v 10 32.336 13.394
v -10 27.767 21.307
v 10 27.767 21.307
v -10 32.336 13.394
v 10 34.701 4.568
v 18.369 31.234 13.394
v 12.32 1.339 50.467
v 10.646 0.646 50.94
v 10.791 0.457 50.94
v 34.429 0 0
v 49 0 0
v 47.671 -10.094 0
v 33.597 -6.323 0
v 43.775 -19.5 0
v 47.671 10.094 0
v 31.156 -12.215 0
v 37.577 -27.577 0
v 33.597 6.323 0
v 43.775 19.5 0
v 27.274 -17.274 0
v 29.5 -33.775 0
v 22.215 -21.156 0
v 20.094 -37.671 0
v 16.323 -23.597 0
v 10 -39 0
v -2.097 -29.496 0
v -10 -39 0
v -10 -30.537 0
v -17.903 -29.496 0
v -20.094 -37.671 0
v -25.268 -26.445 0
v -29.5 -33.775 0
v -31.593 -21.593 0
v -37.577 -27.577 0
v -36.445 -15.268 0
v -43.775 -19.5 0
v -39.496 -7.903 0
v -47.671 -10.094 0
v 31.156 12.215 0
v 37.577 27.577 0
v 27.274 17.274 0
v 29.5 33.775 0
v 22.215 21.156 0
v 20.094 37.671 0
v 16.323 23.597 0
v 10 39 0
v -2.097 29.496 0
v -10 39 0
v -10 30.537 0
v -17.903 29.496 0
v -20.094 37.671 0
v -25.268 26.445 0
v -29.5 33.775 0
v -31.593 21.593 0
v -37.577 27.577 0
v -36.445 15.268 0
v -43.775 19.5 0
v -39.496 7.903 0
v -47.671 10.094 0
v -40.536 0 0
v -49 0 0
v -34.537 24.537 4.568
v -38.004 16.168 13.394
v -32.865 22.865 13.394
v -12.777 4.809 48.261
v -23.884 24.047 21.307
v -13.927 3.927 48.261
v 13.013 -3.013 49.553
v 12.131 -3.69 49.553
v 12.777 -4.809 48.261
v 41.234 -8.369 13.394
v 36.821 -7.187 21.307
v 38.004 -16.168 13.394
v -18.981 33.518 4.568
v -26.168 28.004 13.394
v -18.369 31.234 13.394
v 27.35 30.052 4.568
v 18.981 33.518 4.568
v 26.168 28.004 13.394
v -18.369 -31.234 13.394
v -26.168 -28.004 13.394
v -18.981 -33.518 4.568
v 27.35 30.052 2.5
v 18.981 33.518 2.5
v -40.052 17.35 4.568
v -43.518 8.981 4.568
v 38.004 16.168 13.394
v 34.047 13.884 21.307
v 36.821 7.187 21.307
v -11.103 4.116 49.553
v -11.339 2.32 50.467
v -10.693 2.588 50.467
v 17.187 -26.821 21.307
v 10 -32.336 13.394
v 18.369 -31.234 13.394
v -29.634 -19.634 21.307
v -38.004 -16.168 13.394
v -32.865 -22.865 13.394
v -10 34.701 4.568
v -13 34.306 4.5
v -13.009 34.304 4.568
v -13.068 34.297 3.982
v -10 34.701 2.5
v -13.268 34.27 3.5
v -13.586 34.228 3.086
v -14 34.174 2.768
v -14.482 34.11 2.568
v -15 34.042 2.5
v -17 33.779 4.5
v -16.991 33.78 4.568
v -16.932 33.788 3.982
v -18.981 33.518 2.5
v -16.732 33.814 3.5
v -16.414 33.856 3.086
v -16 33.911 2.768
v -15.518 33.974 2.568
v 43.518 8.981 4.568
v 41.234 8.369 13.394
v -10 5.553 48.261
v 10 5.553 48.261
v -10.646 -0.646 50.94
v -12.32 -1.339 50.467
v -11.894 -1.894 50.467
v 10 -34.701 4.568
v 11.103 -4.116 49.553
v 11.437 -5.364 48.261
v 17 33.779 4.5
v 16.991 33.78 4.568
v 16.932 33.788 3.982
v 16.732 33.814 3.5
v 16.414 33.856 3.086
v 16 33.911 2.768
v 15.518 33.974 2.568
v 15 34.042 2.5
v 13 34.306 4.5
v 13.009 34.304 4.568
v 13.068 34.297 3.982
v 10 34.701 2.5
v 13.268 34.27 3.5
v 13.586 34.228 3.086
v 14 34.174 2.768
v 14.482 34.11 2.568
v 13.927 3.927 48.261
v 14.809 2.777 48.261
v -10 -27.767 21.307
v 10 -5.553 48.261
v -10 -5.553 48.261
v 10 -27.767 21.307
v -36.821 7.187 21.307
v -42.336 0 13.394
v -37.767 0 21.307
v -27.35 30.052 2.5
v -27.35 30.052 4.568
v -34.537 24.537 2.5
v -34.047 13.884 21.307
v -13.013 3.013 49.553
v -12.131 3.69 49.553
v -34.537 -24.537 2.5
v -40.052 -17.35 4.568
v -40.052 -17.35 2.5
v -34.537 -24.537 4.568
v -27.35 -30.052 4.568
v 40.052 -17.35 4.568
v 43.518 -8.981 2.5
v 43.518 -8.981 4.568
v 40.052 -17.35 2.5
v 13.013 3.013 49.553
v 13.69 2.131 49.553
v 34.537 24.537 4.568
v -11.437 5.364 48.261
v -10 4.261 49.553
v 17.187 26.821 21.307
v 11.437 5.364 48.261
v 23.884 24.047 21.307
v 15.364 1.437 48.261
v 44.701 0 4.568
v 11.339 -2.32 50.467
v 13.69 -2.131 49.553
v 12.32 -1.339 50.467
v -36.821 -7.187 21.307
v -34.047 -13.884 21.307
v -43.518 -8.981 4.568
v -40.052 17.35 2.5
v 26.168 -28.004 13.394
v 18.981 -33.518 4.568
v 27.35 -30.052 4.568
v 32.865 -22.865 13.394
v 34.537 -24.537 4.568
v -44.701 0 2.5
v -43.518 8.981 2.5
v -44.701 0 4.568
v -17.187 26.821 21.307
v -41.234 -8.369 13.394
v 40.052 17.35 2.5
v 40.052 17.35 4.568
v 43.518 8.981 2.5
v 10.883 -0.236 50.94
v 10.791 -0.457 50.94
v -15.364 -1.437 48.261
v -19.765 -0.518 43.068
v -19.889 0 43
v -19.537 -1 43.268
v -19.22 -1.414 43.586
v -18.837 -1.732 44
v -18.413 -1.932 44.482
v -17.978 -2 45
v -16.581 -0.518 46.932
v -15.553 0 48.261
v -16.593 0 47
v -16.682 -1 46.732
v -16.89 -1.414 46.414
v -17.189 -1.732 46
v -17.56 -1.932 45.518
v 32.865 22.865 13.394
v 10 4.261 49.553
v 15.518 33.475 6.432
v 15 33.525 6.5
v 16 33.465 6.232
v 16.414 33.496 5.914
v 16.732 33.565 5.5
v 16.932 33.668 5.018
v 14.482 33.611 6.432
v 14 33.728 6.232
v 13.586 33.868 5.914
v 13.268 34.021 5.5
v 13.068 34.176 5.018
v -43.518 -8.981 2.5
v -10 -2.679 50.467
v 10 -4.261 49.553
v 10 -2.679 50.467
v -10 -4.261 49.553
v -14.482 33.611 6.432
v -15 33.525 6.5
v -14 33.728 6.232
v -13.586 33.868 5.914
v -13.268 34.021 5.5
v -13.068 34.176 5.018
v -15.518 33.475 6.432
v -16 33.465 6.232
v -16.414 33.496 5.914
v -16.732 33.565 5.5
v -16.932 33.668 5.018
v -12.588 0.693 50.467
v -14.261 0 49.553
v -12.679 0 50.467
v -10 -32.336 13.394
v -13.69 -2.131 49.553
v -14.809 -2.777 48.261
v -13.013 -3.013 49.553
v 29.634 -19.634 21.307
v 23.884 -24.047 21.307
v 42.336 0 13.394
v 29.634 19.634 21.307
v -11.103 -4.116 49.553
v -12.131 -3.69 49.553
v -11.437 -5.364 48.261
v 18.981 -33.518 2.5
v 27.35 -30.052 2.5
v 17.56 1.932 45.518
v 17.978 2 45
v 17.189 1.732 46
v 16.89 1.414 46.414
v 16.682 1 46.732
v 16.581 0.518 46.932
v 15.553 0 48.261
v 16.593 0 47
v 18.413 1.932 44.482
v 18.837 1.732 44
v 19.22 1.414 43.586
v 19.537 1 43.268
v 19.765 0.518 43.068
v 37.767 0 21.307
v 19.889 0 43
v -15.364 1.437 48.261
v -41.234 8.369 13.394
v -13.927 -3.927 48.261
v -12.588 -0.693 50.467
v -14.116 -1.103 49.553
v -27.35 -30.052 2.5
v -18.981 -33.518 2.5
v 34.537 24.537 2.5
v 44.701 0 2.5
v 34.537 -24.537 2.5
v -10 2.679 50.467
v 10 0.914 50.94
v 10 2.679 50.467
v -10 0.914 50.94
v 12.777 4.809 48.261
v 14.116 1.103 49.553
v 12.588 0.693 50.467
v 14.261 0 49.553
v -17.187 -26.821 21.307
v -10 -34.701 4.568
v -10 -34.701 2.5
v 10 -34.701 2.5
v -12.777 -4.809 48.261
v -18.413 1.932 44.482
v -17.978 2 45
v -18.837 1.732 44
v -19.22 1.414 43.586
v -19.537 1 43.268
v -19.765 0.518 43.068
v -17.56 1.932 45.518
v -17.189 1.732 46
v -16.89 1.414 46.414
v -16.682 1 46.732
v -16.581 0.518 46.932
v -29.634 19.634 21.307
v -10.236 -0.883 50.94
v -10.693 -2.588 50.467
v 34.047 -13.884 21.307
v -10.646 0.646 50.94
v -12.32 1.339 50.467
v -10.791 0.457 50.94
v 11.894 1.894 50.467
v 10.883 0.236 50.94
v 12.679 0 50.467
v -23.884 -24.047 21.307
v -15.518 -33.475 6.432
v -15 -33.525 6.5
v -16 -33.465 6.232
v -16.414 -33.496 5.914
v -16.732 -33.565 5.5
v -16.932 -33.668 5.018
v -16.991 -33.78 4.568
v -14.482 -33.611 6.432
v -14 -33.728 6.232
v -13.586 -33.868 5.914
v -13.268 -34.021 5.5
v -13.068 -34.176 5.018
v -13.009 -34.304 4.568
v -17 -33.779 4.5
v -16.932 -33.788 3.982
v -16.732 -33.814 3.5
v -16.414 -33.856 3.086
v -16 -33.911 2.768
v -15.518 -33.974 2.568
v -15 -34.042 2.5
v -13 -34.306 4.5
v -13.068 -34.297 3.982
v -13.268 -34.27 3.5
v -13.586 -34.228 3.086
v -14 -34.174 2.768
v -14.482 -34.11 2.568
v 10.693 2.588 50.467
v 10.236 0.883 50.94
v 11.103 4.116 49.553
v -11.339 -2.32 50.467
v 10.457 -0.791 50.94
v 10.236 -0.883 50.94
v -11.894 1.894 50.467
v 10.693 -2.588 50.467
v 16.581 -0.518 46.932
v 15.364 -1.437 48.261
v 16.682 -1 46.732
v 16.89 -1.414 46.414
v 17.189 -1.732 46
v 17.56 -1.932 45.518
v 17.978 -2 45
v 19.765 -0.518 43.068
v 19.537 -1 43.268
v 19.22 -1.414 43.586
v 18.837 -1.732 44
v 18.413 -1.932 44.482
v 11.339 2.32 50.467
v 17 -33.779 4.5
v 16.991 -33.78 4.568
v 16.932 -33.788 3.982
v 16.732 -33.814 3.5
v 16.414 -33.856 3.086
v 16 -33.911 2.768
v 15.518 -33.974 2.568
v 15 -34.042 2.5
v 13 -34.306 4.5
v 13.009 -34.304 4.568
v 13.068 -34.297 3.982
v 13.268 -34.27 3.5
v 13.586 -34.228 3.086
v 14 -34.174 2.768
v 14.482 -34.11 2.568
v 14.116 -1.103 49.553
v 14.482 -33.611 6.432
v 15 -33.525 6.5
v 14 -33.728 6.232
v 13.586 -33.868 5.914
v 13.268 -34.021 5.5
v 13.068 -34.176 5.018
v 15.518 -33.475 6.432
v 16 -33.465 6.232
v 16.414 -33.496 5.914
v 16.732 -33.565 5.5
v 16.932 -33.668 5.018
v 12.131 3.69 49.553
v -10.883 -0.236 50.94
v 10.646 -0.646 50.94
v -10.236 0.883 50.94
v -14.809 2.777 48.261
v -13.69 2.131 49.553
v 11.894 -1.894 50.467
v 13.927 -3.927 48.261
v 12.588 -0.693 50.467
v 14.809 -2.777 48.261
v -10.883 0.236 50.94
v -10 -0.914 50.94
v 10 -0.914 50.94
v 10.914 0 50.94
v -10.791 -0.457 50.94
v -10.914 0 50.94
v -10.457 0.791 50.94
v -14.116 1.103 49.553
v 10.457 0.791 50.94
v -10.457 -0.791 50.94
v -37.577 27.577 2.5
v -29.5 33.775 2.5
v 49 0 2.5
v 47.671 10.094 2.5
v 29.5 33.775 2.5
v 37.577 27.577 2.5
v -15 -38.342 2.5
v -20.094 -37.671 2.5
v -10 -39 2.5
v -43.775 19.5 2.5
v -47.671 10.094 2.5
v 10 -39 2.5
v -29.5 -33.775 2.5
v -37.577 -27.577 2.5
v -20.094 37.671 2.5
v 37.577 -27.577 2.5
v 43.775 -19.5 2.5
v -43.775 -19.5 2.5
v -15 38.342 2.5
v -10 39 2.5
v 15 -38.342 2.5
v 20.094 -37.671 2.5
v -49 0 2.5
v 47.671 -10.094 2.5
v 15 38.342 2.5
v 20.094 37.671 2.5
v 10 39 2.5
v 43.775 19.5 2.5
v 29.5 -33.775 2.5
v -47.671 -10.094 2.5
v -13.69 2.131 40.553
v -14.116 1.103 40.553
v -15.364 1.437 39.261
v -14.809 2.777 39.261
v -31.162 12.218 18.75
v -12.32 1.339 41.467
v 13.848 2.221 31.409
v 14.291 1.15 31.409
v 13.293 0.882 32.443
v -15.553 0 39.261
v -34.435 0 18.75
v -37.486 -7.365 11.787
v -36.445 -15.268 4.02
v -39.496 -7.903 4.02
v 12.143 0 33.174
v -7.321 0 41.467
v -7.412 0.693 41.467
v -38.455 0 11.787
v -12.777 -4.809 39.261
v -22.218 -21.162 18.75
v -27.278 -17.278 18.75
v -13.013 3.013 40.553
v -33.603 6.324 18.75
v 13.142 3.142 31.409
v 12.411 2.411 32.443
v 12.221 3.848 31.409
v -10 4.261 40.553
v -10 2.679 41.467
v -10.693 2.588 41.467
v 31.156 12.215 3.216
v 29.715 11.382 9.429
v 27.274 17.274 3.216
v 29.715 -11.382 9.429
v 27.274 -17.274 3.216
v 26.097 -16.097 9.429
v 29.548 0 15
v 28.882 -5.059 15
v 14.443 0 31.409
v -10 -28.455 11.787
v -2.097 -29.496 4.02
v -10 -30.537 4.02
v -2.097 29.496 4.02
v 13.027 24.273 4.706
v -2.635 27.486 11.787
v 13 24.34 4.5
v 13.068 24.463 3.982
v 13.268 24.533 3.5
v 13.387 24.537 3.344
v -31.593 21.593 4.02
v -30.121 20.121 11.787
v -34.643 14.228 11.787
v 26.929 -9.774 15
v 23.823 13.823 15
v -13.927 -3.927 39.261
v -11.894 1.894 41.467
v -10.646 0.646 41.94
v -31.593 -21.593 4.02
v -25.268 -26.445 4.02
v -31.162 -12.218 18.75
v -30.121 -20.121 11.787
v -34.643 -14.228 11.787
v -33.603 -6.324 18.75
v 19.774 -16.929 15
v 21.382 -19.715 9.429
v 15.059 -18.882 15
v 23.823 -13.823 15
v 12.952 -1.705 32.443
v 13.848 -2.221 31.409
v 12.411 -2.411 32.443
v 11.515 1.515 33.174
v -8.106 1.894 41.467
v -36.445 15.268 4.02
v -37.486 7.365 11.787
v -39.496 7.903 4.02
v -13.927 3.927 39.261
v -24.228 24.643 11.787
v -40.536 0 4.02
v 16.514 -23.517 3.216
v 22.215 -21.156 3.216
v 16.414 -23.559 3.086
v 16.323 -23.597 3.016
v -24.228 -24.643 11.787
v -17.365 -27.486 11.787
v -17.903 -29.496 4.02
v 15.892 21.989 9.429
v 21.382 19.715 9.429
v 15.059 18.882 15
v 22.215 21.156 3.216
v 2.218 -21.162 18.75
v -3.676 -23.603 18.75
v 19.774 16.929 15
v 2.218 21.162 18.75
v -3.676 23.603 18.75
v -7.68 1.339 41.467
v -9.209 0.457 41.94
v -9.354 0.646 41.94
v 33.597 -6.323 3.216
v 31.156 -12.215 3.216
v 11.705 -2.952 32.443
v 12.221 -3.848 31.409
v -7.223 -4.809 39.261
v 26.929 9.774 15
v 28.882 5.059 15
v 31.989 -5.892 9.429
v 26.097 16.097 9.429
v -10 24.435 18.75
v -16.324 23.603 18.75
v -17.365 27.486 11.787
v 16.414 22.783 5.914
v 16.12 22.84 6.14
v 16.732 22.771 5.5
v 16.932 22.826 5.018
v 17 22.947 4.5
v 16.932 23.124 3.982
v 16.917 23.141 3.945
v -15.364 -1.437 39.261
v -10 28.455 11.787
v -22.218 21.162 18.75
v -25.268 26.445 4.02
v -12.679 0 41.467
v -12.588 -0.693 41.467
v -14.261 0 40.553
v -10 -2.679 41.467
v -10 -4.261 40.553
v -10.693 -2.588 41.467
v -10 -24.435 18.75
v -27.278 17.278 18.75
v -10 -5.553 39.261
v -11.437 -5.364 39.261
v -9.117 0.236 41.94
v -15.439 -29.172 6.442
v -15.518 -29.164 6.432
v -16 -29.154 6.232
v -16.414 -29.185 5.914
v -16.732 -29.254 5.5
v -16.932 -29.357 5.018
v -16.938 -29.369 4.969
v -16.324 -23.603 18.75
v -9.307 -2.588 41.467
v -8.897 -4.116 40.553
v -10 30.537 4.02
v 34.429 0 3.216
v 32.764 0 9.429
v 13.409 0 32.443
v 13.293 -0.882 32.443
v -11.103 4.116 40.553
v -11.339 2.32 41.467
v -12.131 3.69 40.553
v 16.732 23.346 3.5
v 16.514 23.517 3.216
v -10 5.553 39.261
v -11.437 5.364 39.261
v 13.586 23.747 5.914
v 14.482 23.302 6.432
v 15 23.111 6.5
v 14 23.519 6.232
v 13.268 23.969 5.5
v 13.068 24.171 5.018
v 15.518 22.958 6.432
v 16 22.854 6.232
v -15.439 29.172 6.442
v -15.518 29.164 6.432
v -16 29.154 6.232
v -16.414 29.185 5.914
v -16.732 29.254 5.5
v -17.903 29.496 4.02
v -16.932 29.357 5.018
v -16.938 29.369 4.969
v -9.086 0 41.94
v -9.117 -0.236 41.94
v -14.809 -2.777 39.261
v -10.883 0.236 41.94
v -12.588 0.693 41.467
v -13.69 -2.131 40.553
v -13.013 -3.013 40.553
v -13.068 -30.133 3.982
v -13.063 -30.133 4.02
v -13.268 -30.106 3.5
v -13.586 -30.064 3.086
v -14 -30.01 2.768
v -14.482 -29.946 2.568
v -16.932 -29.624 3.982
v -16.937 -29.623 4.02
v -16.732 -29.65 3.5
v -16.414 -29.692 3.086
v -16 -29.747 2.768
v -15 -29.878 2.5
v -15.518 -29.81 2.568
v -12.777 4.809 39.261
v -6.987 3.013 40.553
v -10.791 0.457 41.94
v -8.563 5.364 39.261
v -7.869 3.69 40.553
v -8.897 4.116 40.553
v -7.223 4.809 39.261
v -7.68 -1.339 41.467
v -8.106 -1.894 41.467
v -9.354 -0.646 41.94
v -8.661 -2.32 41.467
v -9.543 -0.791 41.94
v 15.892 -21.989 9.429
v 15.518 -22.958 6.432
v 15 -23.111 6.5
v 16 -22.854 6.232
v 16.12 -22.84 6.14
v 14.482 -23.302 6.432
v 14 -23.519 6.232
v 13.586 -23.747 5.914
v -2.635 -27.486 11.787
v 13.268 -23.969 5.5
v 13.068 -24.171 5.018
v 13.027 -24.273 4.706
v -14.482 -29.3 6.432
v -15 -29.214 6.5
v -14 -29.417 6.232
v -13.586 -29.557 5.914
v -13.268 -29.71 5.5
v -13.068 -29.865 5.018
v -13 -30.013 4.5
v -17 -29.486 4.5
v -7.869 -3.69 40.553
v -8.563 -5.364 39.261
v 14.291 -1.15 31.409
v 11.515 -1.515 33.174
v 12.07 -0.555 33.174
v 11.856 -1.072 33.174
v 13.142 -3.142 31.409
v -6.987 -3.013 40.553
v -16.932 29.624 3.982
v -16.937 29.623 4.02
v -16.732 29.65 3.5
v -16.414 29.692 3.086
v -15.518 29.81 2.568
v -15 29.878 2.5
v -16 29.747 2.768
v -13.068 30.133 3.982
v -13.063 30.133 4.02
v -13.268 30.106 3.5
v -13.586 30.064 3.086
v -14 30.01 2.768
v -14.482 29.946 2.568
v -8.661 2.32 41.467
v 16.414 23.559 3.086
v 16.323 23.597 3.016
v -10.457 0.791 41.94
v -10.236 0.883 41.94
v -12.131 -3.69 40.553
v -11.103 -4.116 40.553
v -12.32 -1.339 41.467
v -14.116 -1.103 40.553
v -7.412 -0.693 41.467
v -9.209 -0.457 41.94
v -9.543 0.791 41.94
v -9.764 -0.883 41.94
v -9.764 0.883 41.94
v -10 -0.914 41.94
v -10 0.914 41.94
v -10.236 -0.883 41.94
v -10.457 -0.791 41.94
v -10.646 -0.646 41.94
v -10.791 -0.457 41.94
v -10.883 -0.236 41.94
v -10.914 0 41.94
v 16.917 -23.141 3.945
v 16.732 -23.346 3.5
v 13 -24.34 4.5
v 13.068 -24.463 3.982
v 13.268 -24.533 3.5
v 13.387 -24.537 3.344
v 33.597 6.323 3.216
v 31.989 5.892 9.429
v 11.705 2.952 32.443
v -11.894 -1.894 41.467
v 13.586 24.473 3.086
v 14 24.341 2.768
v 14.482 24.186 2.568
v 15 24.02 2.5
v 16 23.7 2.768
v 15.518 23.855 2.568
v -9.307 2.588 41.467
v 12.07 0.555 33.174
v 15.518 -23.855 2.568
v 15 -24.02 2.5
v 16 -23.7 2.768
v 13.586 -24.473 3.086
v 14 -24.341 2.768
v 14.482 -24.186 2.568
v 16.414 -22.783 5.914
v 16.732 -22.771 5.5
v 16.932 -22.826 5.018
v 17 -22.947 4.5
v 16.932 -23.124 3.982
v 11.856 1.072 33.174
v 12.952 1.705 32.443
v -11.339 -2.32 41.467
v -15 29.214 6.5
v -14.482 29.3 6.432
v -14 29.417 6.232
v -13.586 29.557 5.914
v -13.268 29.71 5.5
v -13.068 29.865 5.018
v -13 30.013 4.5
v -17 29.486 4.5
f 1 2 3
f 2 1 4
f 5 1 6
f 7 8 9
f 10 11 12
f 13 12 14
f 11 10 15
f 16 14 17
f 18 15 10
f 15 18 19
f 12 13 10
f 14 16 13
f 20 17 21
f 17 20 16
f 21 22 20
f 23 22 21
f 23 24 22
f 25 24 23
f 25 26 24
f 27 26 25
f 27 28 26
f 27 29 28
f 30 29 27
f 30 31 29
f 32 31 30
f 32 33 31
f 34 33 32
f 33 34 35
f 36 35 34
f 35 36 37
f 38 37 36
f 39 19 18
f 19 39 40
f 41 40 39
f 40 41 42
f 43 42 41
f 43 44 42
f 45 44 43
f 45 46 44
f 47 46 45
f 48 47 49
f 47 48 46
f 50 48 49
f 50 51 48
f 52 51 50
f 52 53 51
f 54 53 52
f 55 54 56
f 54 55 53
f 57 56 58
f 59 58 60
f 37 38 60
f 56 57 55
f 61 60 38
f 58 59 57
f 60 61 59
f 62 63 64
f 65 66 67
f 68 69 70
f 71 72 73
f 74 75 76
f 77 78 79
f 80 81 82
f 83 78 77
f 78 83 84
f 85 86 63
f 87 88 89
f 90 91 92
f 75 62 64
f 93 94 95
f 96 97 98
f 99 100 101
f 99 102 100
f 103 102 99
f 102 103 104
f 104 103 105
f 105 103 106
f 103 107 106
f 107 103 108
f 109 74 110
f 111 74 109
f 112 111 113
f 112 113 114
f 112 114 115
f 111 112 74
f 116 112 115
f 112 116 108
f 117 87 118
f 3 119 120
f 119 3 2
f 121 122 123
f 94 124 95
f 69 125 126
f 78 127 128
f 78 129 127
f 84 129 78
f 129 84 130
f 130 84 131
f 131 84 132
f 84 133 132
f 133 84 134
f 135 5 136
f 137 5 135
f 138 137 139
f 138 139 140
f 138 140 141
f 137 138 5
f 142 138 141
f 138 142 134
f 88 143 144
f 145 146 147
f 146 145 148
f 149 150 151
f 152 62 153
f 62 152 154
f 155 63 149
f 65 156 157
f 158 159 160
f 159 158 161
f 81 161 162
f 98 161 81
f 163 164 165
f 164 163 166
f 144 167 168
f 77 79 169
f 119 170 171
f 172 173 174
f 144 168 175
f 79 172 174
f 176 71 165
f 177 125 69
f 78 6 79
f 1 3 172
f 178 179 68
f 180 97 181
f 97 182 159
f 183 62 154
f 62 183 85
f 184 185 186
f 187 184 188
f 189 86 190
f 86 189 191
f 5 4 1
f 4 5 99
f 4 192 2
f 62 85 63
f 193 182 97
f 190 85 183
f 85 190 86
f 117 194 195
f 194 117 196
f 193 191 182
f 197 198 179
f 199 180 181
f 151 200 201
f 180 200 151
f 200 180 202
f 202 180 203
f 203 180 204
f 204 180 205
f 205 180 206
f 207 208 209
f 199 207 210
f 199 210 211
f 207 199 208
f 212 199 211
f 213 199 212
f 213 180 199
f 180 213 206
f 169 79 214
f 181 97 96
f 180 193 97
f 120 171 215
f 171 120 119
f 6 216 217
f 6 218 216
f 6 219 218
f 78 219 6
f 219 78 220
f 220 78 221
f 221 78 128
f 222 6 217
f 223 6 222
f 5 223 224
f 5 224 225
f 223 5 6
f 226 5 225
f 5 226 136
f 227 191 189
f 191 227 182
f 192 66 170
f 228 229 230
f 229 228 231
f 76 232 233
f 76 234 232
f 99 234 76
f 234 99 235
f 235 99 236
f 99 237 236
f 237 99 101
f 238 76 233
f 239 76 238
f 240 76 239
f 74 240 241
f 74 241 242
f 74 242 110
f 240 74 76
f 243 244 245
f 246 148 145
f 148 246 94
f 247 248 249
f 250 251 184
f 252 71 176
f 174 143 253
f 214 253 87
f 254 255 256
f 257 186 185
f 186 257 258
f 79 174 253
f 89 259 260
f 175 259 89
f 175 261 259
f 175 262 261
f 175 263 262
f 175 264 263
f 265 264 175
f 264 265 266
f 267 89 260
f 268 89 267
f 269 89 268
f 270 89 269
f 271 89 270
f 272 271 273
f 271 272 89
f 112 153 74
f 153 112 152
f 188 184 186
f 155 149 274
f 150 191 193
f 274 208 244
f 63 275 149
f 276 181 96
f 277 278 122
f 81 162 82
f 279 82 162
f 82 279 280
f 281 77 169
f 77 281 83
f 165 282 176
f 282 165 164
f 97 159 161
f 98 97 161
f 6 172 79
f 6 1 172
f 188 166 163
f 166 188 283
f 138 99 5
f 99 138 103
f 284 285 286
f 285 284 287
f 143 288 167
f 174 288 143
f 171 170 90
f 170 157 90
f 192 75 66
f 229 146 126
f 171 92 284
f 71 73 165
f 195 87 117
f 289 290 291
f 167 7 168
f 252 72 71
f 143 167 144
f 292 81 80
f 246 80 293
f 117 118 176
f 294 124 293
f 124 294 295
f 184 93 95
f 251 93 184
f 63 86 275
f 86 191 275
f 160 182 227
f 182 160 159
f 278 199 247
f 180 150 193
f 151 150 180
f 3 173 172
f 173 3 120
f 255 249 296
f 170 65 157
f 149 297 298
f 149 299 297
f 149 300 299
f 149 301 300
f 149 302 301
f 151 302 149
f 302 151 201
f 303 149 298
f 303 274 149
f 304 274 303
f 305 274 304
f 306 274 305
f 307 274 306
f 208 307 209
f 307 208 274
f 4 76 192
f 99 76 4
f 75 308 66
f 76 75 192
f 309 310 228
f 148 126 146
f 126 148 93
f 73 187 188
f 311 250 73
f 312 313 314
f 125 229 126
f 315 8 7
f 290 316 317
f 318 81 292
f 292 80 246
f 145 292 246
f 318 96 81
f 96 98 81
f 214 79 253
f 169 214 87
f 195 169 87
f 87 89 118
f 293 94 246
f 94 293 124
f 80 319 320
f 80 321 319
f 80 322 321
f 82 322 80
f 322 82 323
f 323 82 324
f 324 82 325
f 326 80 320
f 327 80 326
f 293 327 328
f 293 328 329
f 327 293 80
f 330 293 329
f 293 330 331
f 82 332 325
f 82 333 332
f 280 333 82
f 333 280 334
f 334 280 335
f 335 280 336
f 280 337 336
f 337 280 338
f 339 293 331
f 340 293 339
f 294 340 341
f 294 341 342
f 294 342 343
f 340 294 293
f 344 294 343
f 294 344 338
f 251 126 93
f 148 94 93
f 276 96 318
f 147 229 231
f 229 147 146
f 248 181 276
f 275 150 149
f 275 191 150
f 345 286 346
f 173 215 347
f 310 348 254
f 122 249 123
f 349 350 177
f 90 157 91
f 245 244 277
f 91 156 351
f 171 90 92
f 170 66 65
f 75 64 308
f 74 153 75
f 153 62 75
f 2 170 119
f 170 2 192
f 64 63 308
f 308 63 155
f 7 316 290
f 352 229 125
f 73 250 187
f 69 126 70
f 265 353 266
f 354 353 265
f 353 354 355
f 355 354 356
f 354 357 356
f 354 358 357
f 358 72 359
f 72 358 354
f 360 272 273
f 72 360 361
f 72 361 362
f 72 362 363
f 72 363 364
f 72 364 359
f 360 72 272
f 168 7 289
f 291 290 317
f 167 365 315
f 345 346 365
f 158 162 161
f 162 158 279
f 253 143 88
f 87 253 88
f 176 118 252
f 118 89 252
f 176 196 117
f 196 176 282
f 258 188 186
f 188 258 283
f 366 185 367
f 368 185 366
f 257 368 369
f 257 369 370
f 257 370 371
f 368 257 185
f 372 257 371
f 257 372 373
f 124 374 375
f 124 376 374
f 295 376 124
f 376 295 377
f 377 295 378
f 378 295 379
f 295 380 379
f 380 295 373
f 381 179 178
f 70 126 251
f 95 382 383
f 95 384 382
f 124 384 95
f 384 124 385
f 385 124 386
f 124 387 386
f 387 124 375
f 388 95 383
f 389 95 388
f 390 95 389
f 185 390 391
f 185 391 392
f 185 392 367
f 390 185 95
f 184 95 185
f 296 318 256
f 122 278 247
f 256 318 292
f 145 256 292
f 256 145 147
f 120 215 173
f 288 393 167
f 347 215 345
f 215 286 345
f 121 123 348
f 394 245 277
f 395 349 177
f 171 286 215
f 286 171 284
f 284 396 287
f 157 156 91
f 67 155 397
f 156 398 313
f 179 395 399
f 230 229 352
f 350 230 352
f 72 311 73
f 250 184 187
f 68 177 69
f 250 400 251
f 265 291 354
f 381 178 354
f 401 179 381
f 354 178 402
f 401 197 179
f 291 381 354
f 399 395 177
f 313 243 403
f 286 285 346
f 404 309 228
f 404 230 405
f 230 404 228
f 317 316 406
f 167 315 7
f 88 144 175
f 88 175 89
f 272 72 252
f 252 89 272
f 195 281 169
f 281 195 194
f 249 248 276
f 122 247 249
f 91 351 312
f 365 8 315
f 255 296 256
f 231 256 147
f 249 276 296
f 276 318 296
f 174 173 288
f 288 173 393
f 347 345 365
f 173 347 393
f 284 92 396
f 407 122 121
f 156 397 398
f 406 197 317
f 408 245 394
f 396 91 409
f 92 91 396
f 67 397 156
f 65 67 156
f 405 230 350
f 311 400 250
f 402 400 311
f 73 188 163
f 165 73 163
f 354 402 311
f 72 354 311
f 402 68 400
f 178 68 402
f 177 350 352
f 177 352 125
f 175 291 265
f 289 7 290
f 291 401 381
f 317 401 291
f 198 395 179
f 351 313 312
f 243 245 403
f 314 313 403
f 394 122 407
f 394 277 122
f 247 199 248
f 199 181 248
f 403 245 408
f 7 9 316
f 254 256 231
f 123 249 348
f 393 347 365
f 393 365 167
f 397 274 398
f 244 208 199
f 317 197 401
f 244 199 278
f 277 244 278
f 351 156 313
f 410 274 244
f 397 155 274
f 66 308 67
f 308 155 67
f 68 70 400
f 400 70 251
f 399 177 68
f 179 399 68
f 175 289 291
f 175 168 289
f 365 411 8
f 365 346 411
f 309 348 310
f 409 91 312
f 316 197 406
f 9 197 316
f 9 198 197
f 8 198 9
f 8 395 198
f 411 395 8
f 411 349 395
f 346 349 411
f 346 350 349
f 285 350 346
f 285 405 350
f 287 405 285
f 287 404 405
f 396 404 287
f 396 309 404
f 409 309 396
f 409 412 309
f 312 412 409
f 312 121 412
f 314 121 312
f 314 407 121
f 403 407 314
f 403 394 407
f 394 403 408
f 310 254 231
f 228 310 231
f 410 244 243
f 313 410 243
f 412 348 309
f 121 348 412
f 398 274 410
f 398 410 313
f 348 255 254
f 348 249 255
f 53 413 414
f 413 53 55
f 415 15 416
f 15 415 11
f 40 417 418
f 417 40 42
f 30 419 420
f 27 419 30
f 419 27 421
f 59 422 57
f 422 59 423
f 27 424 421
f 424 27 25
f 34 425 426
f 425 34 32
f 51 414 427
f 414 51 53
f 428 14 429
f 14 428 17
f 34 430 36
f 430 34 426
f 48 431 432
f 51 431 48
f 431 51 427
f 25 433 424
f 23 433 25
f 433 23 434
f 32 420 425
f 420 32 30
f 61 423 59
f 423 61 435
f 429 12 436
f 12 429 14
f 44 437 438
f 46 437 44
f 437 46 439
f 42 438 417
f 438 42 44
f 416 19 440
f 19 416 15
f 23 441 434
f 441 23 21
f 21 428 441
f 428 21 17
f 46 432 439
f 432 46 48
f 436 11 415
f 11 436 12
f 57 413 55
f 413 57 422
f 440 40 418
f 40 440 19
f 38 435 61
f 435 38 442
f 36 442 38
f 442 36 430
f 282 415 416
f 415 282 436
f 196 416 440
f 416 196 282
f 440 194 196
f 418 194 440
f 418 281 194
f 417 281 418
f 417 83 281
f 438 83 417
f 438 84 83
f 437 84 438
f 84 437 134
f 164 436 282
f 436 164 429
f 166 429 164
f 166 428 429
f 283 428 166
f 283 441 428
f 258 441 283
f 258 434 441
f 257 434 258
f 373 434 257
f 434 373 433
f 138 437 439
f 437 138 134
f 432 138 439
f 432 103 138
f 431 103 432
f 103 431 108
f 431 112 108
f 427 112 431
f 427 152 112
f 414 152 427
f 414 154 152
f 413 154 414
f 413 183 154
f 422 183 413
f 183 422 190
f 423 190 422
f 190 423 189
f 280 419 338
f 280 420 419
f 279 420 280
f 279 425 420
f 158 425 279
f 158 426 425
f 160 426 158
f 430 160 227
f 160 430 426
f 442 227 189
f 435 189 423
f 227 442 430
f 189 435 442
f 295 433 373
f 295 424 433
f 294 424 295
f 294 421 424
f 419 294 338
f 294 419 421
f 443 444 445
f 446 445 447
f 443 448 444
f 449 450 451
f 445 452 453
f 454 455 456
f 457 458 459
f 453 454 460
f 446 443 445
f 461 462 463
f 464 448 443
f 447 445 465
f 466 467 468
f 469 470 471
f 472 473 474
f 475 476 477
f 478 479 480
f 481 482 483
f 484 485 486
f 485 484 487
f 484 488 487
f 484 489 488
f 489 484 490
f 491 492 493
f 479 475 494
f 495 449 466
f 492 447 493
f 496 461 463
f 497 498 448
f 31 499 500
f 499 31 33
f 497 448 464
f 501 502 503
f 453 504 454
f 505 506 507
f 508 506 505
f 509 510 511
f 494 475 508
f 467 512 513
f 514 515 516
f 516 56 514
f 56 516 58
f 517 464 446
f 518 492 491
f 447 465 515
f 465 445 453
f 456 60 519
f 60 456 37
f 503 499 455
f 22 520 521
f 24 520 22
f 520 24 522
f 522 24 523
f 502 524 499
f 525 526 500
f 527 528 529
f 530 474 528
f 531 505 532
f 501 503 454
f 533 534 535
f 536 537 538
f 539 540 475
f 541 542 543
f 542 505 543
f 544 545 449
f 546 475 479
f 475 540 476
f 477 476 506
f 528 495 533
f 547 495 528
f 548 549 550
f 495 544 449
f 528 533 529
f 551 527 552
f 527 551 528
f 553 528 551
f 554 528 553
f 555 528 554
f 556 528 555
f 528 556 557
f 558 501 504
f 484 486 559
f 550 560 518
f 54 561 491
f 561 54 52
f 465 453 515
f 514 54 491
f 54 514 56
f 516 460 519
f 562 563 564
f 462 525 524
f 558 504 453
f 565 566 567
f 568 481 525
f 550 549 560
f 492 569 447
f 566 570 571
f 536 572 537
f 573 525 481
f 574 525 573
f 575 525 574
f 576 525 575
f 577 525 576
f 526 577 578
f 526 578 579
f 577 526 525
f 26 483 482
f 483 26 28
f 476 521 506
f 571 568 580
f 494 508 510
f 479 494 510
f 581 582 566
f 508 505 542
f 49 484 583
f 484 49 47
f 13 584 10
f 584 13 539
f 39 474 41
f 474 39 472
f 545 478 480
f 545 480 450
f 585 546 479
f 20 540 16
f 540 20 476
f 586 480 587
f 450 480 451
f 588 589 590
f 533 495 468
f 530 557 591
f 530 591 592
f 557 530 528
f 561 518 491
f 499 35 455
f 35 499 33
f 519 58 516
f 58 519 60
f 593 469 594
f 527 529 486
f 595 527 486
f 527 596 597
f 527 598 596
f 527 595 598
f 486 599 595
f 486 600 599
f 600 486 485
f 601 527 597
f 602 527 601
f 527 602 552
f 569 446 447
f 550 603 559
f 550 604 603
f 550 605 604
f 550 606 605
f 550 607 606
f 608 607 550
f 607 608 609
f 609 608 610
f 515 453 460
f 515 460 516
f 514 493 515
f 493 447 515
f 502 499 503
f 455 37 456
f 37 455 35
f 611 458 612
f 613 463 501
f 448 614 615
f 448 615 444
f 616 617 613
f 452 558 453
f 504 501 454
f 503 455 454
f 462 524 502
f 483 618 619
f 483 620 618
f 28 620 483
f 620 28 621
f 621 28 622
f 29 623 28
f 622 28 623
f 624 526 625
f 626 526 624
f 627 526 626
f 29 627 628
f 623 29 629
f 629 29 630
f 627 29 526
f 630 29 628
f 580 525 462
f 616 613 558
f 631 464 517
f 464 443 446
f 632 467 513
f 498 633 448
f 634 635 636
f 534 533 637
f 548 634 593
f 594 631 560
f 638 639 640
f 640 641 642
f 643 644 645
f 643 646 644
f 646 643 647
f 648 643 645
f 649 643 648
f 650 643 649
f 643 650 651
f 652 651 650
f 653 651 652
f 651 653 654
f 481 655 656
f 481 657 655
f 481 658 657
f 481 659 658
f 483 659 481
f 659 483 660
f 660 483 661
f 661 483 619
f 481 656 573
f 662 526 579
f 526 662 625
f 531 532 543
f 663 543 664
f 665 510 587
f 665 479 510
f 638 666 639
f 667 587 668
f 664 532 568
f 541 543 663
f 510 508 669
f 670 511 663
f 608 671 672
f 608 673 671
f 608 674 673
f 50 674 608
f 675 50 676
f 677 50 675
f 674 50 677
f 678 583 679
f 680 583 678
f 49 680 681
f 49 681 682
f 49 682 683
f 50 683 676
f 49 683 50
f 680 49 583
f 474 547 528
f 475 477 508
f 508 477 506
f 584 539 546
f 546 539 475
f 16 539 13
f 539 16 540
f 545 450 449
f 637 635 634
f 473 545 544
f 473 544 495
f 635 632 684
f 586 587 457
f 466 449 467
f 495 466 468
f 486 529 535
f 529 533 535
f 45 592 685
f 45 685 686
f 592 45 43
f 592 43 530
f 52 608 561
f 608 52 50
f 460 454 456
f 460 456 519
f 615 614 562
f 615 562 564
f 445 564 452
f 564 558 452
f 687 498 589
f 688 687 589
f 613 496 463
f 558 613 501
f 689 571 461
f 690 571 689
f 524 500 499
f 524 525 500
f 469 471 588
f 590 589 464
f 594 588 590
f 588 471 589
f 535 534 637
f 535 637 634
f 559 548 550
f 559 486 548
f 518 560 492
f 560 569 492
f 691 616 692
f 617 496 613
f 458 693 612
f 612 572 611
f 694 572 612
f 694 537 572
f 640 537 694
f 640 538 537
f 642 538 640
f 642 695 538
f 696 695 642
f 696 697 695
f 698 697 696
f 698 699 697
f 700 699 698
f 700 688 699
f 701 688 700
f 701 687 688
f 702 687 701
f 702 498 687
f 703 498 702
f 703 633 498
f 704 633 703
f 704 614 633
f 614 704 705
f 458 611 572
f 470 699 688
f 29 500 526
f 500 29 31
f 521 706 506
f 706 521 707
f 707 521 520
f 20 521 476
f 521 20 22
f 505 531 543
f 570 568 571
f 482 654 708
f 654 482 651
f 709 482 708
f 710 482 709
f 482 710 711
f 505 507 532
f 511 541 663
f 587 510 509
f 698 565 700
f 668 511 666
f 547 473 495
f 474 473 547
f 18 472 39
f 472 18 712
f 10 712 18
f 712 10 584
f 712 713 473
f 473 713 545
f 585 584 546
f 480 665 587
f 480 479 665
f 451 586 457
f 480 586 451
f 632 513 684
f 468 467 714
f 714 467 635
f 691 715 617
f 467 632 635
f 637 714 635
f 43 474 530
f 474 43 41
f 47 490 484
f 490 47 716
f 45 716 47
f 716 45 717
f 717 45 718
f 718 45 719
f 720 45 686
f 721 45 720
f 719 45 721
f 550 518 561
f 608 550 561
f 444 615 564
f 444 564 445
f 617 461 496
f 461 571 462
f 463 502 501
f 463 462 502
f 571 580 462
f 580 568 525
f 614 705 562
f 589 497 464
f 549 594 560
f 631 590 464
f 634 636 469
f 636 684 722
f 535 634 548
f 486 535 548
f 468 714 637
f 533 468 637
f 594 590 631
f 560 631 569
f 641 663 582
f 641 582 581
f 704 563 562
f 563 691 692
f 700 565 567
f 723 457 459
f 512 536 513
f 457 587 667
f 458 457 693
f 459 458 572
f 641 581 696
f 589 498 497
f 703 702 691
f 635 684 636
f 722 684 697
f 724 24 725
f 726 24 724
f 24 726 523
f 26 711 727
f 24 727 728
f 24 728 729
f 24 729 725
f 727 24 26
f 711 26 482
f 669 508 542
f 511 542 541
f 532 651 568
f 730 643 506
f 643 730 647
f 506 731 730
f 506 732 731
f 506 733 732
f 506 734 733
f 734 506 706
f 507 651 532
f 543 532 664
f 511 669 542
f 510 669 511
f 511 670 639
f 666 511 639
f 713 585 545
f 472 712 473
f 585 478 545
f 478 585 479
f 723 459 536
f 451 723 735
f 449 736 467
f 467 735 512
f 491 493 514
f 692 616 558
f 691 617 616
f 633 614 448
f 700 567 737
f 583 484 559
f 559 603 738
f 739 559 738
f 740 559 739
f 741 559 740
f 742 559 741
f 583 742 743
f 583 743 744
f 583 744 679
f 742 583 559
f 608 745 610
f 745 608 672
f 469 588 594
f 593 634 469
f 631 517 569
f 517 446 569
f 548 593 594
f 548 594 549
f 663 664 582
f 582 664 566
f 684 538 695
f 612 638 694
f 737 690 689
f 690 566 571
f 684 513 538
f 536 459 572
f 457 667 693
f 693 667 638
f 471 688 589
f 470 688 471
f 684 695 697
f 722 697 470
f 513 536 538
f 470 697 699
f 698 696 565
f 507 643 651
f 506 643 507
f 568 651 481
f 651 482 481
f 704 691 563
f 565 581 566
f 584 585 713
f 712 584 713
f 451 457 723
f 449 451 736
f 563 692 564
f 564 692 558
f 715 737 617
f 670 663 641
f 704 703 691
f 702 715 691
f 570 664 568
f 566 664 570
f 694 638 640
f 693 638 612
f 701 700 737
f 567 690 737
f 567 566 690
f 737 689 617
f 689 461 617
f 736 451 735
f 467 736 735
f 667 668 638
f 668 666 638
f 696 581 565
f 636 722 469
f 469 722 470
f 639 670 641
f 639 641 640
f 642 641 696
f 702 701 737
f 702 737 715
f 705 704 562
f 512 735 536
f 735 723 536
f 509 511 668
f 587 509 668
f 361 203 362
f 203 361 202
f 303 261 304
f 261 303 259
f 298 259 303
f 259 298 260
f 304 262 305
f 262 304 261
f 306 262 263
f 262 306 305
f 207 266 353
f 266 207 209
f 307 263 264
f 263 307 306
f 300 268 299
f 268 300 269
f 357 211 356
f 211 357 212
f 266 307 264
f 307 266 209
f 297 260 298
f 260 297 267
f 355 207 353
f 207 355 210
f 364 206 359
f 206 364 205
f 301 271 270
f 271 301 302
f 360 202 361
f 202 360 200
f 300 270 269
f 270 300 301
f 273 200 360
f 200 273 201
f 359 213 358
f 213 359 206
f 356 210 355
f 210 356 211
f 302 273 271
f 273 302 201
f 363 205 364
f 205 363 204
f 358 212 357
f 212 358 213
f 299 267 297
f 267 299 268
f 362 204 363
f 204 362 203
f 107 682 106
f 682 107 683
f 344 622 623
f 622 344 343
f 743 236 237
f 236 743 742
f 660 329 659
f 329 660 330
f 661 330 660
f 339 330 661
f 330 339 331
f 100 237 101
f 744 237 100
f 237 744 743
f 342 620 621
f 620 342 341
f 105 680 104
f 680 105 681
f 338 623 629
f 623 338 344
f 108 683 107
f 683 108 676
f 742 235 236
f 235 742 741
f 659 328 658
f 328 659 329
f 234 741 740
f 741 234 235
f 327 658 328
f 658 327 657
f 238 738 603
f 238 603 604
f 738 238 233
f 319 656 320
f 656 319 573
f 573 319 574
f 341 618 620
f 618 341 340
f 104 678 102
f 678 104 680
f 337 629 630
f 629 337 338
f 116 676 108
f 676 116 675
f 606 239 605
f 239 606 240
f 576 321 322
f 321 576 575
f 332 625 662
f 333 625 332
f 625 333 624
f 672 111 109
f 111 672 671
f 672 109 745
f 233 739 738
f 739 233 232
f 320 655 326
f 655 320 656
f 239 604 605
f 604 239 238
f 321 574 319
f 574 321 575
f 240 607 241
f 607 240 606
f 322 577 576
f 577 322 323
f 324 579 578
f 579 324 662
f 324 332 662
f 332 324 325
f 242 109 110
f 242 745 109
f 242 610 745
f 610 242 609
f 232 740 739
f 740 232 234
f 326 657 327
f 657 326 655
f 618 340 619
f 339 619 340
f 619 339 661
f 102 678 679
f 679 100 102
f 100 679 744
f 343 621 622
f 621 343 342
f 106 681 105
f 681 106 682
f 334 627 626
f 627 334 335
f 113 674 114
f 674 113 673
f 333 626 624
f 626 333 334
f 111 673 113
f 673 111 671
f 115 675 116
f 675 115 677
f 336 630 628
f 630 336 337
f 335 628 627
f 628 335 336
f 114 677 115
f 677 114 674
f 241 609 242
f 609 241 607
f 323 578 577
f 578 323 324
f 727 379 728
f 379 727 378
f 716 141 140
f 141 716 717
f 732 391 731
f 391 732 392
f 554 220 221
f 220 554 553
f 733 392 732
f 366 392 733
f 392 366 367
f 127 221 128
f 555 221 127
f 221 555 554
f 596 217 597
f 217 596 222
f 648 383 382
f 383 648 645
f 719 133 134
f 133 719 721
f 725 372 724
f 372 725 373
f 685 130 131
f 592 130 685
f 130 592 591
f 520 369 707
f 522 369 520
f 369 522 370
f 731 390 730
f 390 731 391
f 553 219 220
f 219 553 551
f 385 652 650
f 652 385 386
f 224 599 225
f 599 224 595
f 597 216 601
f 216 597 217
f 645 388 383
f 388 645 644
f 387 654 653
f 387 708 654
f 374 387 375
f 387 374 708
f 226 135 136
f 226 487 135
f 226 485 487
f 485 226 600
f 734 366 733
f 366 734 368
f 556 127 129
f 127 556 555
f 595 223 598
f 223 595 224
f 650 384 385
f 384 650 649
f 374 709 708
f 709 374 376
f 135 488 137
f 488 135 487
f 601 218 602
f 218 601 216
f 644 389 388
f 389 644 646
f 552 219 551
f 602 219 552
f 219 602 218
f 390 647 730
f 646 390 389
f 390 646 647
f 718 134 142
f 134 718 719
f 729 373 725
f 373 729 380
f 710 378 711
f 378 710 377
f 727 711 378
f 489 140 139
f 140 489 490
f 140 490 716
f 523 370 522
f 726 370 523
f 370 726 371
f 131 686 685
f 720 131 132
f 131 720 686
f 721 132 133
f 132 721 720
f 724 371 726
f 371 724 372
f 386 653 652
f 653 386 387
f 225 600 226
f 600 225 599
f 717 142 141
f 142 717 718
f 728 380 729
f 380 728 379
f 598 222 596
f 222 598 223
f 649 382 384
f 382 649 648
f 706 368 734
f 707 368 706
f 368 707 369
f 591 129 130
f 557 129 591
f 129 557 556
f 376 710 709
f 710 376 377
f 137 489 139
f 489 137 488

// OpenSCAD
diam=35;
$fn=24;
module outershell(diam){
	union(){
		intersection(){
			hull(){
				sphere(r=diam);
				translate([0,0,diam+9]) sphere(r=diam/5);
			}
			translate([-diam,-diam,0]) cube([diam*2,diam*2,diam*2]);
		}
	}
}
module innershell(diam){
	hull(){
			sphere(r=diam*(22/25));
			translate([0,0,diam]) sphere(r=diam/5);
		}
}

difference(){

	union(){
		hull(){
			translate([-10,0,0]) outershell(diam);
			translate([10,0,0]) outershell(diam);
		}

		hull(){
			translate([-10,0,0]) 		cylinder(r=diam+4,h=2.5);;
			translate([10,0,0]) 		cylinder(r=diam+4,h=2.5);;
		}
	}

	hull(){
		translate([-10,0,0]) innershell(diam);
		translate([10,0,0]) innershell(diam*0.8);
	}


	// rope holes		
	translate([-diam*2,0,diam+4+5+1]) rotate([90,0,90]) #cylinder(r=2,h=diam*4);
	// ziptie holes
	translate([-15,diam*2,2+2.5]) rotate([90,0,0]) cylinder(r=2,h=diam*4);
	translate([15,diam*2,2+2.5]) rotate([90,0,0]) cylinder(r=2,h=diam*4);
}
